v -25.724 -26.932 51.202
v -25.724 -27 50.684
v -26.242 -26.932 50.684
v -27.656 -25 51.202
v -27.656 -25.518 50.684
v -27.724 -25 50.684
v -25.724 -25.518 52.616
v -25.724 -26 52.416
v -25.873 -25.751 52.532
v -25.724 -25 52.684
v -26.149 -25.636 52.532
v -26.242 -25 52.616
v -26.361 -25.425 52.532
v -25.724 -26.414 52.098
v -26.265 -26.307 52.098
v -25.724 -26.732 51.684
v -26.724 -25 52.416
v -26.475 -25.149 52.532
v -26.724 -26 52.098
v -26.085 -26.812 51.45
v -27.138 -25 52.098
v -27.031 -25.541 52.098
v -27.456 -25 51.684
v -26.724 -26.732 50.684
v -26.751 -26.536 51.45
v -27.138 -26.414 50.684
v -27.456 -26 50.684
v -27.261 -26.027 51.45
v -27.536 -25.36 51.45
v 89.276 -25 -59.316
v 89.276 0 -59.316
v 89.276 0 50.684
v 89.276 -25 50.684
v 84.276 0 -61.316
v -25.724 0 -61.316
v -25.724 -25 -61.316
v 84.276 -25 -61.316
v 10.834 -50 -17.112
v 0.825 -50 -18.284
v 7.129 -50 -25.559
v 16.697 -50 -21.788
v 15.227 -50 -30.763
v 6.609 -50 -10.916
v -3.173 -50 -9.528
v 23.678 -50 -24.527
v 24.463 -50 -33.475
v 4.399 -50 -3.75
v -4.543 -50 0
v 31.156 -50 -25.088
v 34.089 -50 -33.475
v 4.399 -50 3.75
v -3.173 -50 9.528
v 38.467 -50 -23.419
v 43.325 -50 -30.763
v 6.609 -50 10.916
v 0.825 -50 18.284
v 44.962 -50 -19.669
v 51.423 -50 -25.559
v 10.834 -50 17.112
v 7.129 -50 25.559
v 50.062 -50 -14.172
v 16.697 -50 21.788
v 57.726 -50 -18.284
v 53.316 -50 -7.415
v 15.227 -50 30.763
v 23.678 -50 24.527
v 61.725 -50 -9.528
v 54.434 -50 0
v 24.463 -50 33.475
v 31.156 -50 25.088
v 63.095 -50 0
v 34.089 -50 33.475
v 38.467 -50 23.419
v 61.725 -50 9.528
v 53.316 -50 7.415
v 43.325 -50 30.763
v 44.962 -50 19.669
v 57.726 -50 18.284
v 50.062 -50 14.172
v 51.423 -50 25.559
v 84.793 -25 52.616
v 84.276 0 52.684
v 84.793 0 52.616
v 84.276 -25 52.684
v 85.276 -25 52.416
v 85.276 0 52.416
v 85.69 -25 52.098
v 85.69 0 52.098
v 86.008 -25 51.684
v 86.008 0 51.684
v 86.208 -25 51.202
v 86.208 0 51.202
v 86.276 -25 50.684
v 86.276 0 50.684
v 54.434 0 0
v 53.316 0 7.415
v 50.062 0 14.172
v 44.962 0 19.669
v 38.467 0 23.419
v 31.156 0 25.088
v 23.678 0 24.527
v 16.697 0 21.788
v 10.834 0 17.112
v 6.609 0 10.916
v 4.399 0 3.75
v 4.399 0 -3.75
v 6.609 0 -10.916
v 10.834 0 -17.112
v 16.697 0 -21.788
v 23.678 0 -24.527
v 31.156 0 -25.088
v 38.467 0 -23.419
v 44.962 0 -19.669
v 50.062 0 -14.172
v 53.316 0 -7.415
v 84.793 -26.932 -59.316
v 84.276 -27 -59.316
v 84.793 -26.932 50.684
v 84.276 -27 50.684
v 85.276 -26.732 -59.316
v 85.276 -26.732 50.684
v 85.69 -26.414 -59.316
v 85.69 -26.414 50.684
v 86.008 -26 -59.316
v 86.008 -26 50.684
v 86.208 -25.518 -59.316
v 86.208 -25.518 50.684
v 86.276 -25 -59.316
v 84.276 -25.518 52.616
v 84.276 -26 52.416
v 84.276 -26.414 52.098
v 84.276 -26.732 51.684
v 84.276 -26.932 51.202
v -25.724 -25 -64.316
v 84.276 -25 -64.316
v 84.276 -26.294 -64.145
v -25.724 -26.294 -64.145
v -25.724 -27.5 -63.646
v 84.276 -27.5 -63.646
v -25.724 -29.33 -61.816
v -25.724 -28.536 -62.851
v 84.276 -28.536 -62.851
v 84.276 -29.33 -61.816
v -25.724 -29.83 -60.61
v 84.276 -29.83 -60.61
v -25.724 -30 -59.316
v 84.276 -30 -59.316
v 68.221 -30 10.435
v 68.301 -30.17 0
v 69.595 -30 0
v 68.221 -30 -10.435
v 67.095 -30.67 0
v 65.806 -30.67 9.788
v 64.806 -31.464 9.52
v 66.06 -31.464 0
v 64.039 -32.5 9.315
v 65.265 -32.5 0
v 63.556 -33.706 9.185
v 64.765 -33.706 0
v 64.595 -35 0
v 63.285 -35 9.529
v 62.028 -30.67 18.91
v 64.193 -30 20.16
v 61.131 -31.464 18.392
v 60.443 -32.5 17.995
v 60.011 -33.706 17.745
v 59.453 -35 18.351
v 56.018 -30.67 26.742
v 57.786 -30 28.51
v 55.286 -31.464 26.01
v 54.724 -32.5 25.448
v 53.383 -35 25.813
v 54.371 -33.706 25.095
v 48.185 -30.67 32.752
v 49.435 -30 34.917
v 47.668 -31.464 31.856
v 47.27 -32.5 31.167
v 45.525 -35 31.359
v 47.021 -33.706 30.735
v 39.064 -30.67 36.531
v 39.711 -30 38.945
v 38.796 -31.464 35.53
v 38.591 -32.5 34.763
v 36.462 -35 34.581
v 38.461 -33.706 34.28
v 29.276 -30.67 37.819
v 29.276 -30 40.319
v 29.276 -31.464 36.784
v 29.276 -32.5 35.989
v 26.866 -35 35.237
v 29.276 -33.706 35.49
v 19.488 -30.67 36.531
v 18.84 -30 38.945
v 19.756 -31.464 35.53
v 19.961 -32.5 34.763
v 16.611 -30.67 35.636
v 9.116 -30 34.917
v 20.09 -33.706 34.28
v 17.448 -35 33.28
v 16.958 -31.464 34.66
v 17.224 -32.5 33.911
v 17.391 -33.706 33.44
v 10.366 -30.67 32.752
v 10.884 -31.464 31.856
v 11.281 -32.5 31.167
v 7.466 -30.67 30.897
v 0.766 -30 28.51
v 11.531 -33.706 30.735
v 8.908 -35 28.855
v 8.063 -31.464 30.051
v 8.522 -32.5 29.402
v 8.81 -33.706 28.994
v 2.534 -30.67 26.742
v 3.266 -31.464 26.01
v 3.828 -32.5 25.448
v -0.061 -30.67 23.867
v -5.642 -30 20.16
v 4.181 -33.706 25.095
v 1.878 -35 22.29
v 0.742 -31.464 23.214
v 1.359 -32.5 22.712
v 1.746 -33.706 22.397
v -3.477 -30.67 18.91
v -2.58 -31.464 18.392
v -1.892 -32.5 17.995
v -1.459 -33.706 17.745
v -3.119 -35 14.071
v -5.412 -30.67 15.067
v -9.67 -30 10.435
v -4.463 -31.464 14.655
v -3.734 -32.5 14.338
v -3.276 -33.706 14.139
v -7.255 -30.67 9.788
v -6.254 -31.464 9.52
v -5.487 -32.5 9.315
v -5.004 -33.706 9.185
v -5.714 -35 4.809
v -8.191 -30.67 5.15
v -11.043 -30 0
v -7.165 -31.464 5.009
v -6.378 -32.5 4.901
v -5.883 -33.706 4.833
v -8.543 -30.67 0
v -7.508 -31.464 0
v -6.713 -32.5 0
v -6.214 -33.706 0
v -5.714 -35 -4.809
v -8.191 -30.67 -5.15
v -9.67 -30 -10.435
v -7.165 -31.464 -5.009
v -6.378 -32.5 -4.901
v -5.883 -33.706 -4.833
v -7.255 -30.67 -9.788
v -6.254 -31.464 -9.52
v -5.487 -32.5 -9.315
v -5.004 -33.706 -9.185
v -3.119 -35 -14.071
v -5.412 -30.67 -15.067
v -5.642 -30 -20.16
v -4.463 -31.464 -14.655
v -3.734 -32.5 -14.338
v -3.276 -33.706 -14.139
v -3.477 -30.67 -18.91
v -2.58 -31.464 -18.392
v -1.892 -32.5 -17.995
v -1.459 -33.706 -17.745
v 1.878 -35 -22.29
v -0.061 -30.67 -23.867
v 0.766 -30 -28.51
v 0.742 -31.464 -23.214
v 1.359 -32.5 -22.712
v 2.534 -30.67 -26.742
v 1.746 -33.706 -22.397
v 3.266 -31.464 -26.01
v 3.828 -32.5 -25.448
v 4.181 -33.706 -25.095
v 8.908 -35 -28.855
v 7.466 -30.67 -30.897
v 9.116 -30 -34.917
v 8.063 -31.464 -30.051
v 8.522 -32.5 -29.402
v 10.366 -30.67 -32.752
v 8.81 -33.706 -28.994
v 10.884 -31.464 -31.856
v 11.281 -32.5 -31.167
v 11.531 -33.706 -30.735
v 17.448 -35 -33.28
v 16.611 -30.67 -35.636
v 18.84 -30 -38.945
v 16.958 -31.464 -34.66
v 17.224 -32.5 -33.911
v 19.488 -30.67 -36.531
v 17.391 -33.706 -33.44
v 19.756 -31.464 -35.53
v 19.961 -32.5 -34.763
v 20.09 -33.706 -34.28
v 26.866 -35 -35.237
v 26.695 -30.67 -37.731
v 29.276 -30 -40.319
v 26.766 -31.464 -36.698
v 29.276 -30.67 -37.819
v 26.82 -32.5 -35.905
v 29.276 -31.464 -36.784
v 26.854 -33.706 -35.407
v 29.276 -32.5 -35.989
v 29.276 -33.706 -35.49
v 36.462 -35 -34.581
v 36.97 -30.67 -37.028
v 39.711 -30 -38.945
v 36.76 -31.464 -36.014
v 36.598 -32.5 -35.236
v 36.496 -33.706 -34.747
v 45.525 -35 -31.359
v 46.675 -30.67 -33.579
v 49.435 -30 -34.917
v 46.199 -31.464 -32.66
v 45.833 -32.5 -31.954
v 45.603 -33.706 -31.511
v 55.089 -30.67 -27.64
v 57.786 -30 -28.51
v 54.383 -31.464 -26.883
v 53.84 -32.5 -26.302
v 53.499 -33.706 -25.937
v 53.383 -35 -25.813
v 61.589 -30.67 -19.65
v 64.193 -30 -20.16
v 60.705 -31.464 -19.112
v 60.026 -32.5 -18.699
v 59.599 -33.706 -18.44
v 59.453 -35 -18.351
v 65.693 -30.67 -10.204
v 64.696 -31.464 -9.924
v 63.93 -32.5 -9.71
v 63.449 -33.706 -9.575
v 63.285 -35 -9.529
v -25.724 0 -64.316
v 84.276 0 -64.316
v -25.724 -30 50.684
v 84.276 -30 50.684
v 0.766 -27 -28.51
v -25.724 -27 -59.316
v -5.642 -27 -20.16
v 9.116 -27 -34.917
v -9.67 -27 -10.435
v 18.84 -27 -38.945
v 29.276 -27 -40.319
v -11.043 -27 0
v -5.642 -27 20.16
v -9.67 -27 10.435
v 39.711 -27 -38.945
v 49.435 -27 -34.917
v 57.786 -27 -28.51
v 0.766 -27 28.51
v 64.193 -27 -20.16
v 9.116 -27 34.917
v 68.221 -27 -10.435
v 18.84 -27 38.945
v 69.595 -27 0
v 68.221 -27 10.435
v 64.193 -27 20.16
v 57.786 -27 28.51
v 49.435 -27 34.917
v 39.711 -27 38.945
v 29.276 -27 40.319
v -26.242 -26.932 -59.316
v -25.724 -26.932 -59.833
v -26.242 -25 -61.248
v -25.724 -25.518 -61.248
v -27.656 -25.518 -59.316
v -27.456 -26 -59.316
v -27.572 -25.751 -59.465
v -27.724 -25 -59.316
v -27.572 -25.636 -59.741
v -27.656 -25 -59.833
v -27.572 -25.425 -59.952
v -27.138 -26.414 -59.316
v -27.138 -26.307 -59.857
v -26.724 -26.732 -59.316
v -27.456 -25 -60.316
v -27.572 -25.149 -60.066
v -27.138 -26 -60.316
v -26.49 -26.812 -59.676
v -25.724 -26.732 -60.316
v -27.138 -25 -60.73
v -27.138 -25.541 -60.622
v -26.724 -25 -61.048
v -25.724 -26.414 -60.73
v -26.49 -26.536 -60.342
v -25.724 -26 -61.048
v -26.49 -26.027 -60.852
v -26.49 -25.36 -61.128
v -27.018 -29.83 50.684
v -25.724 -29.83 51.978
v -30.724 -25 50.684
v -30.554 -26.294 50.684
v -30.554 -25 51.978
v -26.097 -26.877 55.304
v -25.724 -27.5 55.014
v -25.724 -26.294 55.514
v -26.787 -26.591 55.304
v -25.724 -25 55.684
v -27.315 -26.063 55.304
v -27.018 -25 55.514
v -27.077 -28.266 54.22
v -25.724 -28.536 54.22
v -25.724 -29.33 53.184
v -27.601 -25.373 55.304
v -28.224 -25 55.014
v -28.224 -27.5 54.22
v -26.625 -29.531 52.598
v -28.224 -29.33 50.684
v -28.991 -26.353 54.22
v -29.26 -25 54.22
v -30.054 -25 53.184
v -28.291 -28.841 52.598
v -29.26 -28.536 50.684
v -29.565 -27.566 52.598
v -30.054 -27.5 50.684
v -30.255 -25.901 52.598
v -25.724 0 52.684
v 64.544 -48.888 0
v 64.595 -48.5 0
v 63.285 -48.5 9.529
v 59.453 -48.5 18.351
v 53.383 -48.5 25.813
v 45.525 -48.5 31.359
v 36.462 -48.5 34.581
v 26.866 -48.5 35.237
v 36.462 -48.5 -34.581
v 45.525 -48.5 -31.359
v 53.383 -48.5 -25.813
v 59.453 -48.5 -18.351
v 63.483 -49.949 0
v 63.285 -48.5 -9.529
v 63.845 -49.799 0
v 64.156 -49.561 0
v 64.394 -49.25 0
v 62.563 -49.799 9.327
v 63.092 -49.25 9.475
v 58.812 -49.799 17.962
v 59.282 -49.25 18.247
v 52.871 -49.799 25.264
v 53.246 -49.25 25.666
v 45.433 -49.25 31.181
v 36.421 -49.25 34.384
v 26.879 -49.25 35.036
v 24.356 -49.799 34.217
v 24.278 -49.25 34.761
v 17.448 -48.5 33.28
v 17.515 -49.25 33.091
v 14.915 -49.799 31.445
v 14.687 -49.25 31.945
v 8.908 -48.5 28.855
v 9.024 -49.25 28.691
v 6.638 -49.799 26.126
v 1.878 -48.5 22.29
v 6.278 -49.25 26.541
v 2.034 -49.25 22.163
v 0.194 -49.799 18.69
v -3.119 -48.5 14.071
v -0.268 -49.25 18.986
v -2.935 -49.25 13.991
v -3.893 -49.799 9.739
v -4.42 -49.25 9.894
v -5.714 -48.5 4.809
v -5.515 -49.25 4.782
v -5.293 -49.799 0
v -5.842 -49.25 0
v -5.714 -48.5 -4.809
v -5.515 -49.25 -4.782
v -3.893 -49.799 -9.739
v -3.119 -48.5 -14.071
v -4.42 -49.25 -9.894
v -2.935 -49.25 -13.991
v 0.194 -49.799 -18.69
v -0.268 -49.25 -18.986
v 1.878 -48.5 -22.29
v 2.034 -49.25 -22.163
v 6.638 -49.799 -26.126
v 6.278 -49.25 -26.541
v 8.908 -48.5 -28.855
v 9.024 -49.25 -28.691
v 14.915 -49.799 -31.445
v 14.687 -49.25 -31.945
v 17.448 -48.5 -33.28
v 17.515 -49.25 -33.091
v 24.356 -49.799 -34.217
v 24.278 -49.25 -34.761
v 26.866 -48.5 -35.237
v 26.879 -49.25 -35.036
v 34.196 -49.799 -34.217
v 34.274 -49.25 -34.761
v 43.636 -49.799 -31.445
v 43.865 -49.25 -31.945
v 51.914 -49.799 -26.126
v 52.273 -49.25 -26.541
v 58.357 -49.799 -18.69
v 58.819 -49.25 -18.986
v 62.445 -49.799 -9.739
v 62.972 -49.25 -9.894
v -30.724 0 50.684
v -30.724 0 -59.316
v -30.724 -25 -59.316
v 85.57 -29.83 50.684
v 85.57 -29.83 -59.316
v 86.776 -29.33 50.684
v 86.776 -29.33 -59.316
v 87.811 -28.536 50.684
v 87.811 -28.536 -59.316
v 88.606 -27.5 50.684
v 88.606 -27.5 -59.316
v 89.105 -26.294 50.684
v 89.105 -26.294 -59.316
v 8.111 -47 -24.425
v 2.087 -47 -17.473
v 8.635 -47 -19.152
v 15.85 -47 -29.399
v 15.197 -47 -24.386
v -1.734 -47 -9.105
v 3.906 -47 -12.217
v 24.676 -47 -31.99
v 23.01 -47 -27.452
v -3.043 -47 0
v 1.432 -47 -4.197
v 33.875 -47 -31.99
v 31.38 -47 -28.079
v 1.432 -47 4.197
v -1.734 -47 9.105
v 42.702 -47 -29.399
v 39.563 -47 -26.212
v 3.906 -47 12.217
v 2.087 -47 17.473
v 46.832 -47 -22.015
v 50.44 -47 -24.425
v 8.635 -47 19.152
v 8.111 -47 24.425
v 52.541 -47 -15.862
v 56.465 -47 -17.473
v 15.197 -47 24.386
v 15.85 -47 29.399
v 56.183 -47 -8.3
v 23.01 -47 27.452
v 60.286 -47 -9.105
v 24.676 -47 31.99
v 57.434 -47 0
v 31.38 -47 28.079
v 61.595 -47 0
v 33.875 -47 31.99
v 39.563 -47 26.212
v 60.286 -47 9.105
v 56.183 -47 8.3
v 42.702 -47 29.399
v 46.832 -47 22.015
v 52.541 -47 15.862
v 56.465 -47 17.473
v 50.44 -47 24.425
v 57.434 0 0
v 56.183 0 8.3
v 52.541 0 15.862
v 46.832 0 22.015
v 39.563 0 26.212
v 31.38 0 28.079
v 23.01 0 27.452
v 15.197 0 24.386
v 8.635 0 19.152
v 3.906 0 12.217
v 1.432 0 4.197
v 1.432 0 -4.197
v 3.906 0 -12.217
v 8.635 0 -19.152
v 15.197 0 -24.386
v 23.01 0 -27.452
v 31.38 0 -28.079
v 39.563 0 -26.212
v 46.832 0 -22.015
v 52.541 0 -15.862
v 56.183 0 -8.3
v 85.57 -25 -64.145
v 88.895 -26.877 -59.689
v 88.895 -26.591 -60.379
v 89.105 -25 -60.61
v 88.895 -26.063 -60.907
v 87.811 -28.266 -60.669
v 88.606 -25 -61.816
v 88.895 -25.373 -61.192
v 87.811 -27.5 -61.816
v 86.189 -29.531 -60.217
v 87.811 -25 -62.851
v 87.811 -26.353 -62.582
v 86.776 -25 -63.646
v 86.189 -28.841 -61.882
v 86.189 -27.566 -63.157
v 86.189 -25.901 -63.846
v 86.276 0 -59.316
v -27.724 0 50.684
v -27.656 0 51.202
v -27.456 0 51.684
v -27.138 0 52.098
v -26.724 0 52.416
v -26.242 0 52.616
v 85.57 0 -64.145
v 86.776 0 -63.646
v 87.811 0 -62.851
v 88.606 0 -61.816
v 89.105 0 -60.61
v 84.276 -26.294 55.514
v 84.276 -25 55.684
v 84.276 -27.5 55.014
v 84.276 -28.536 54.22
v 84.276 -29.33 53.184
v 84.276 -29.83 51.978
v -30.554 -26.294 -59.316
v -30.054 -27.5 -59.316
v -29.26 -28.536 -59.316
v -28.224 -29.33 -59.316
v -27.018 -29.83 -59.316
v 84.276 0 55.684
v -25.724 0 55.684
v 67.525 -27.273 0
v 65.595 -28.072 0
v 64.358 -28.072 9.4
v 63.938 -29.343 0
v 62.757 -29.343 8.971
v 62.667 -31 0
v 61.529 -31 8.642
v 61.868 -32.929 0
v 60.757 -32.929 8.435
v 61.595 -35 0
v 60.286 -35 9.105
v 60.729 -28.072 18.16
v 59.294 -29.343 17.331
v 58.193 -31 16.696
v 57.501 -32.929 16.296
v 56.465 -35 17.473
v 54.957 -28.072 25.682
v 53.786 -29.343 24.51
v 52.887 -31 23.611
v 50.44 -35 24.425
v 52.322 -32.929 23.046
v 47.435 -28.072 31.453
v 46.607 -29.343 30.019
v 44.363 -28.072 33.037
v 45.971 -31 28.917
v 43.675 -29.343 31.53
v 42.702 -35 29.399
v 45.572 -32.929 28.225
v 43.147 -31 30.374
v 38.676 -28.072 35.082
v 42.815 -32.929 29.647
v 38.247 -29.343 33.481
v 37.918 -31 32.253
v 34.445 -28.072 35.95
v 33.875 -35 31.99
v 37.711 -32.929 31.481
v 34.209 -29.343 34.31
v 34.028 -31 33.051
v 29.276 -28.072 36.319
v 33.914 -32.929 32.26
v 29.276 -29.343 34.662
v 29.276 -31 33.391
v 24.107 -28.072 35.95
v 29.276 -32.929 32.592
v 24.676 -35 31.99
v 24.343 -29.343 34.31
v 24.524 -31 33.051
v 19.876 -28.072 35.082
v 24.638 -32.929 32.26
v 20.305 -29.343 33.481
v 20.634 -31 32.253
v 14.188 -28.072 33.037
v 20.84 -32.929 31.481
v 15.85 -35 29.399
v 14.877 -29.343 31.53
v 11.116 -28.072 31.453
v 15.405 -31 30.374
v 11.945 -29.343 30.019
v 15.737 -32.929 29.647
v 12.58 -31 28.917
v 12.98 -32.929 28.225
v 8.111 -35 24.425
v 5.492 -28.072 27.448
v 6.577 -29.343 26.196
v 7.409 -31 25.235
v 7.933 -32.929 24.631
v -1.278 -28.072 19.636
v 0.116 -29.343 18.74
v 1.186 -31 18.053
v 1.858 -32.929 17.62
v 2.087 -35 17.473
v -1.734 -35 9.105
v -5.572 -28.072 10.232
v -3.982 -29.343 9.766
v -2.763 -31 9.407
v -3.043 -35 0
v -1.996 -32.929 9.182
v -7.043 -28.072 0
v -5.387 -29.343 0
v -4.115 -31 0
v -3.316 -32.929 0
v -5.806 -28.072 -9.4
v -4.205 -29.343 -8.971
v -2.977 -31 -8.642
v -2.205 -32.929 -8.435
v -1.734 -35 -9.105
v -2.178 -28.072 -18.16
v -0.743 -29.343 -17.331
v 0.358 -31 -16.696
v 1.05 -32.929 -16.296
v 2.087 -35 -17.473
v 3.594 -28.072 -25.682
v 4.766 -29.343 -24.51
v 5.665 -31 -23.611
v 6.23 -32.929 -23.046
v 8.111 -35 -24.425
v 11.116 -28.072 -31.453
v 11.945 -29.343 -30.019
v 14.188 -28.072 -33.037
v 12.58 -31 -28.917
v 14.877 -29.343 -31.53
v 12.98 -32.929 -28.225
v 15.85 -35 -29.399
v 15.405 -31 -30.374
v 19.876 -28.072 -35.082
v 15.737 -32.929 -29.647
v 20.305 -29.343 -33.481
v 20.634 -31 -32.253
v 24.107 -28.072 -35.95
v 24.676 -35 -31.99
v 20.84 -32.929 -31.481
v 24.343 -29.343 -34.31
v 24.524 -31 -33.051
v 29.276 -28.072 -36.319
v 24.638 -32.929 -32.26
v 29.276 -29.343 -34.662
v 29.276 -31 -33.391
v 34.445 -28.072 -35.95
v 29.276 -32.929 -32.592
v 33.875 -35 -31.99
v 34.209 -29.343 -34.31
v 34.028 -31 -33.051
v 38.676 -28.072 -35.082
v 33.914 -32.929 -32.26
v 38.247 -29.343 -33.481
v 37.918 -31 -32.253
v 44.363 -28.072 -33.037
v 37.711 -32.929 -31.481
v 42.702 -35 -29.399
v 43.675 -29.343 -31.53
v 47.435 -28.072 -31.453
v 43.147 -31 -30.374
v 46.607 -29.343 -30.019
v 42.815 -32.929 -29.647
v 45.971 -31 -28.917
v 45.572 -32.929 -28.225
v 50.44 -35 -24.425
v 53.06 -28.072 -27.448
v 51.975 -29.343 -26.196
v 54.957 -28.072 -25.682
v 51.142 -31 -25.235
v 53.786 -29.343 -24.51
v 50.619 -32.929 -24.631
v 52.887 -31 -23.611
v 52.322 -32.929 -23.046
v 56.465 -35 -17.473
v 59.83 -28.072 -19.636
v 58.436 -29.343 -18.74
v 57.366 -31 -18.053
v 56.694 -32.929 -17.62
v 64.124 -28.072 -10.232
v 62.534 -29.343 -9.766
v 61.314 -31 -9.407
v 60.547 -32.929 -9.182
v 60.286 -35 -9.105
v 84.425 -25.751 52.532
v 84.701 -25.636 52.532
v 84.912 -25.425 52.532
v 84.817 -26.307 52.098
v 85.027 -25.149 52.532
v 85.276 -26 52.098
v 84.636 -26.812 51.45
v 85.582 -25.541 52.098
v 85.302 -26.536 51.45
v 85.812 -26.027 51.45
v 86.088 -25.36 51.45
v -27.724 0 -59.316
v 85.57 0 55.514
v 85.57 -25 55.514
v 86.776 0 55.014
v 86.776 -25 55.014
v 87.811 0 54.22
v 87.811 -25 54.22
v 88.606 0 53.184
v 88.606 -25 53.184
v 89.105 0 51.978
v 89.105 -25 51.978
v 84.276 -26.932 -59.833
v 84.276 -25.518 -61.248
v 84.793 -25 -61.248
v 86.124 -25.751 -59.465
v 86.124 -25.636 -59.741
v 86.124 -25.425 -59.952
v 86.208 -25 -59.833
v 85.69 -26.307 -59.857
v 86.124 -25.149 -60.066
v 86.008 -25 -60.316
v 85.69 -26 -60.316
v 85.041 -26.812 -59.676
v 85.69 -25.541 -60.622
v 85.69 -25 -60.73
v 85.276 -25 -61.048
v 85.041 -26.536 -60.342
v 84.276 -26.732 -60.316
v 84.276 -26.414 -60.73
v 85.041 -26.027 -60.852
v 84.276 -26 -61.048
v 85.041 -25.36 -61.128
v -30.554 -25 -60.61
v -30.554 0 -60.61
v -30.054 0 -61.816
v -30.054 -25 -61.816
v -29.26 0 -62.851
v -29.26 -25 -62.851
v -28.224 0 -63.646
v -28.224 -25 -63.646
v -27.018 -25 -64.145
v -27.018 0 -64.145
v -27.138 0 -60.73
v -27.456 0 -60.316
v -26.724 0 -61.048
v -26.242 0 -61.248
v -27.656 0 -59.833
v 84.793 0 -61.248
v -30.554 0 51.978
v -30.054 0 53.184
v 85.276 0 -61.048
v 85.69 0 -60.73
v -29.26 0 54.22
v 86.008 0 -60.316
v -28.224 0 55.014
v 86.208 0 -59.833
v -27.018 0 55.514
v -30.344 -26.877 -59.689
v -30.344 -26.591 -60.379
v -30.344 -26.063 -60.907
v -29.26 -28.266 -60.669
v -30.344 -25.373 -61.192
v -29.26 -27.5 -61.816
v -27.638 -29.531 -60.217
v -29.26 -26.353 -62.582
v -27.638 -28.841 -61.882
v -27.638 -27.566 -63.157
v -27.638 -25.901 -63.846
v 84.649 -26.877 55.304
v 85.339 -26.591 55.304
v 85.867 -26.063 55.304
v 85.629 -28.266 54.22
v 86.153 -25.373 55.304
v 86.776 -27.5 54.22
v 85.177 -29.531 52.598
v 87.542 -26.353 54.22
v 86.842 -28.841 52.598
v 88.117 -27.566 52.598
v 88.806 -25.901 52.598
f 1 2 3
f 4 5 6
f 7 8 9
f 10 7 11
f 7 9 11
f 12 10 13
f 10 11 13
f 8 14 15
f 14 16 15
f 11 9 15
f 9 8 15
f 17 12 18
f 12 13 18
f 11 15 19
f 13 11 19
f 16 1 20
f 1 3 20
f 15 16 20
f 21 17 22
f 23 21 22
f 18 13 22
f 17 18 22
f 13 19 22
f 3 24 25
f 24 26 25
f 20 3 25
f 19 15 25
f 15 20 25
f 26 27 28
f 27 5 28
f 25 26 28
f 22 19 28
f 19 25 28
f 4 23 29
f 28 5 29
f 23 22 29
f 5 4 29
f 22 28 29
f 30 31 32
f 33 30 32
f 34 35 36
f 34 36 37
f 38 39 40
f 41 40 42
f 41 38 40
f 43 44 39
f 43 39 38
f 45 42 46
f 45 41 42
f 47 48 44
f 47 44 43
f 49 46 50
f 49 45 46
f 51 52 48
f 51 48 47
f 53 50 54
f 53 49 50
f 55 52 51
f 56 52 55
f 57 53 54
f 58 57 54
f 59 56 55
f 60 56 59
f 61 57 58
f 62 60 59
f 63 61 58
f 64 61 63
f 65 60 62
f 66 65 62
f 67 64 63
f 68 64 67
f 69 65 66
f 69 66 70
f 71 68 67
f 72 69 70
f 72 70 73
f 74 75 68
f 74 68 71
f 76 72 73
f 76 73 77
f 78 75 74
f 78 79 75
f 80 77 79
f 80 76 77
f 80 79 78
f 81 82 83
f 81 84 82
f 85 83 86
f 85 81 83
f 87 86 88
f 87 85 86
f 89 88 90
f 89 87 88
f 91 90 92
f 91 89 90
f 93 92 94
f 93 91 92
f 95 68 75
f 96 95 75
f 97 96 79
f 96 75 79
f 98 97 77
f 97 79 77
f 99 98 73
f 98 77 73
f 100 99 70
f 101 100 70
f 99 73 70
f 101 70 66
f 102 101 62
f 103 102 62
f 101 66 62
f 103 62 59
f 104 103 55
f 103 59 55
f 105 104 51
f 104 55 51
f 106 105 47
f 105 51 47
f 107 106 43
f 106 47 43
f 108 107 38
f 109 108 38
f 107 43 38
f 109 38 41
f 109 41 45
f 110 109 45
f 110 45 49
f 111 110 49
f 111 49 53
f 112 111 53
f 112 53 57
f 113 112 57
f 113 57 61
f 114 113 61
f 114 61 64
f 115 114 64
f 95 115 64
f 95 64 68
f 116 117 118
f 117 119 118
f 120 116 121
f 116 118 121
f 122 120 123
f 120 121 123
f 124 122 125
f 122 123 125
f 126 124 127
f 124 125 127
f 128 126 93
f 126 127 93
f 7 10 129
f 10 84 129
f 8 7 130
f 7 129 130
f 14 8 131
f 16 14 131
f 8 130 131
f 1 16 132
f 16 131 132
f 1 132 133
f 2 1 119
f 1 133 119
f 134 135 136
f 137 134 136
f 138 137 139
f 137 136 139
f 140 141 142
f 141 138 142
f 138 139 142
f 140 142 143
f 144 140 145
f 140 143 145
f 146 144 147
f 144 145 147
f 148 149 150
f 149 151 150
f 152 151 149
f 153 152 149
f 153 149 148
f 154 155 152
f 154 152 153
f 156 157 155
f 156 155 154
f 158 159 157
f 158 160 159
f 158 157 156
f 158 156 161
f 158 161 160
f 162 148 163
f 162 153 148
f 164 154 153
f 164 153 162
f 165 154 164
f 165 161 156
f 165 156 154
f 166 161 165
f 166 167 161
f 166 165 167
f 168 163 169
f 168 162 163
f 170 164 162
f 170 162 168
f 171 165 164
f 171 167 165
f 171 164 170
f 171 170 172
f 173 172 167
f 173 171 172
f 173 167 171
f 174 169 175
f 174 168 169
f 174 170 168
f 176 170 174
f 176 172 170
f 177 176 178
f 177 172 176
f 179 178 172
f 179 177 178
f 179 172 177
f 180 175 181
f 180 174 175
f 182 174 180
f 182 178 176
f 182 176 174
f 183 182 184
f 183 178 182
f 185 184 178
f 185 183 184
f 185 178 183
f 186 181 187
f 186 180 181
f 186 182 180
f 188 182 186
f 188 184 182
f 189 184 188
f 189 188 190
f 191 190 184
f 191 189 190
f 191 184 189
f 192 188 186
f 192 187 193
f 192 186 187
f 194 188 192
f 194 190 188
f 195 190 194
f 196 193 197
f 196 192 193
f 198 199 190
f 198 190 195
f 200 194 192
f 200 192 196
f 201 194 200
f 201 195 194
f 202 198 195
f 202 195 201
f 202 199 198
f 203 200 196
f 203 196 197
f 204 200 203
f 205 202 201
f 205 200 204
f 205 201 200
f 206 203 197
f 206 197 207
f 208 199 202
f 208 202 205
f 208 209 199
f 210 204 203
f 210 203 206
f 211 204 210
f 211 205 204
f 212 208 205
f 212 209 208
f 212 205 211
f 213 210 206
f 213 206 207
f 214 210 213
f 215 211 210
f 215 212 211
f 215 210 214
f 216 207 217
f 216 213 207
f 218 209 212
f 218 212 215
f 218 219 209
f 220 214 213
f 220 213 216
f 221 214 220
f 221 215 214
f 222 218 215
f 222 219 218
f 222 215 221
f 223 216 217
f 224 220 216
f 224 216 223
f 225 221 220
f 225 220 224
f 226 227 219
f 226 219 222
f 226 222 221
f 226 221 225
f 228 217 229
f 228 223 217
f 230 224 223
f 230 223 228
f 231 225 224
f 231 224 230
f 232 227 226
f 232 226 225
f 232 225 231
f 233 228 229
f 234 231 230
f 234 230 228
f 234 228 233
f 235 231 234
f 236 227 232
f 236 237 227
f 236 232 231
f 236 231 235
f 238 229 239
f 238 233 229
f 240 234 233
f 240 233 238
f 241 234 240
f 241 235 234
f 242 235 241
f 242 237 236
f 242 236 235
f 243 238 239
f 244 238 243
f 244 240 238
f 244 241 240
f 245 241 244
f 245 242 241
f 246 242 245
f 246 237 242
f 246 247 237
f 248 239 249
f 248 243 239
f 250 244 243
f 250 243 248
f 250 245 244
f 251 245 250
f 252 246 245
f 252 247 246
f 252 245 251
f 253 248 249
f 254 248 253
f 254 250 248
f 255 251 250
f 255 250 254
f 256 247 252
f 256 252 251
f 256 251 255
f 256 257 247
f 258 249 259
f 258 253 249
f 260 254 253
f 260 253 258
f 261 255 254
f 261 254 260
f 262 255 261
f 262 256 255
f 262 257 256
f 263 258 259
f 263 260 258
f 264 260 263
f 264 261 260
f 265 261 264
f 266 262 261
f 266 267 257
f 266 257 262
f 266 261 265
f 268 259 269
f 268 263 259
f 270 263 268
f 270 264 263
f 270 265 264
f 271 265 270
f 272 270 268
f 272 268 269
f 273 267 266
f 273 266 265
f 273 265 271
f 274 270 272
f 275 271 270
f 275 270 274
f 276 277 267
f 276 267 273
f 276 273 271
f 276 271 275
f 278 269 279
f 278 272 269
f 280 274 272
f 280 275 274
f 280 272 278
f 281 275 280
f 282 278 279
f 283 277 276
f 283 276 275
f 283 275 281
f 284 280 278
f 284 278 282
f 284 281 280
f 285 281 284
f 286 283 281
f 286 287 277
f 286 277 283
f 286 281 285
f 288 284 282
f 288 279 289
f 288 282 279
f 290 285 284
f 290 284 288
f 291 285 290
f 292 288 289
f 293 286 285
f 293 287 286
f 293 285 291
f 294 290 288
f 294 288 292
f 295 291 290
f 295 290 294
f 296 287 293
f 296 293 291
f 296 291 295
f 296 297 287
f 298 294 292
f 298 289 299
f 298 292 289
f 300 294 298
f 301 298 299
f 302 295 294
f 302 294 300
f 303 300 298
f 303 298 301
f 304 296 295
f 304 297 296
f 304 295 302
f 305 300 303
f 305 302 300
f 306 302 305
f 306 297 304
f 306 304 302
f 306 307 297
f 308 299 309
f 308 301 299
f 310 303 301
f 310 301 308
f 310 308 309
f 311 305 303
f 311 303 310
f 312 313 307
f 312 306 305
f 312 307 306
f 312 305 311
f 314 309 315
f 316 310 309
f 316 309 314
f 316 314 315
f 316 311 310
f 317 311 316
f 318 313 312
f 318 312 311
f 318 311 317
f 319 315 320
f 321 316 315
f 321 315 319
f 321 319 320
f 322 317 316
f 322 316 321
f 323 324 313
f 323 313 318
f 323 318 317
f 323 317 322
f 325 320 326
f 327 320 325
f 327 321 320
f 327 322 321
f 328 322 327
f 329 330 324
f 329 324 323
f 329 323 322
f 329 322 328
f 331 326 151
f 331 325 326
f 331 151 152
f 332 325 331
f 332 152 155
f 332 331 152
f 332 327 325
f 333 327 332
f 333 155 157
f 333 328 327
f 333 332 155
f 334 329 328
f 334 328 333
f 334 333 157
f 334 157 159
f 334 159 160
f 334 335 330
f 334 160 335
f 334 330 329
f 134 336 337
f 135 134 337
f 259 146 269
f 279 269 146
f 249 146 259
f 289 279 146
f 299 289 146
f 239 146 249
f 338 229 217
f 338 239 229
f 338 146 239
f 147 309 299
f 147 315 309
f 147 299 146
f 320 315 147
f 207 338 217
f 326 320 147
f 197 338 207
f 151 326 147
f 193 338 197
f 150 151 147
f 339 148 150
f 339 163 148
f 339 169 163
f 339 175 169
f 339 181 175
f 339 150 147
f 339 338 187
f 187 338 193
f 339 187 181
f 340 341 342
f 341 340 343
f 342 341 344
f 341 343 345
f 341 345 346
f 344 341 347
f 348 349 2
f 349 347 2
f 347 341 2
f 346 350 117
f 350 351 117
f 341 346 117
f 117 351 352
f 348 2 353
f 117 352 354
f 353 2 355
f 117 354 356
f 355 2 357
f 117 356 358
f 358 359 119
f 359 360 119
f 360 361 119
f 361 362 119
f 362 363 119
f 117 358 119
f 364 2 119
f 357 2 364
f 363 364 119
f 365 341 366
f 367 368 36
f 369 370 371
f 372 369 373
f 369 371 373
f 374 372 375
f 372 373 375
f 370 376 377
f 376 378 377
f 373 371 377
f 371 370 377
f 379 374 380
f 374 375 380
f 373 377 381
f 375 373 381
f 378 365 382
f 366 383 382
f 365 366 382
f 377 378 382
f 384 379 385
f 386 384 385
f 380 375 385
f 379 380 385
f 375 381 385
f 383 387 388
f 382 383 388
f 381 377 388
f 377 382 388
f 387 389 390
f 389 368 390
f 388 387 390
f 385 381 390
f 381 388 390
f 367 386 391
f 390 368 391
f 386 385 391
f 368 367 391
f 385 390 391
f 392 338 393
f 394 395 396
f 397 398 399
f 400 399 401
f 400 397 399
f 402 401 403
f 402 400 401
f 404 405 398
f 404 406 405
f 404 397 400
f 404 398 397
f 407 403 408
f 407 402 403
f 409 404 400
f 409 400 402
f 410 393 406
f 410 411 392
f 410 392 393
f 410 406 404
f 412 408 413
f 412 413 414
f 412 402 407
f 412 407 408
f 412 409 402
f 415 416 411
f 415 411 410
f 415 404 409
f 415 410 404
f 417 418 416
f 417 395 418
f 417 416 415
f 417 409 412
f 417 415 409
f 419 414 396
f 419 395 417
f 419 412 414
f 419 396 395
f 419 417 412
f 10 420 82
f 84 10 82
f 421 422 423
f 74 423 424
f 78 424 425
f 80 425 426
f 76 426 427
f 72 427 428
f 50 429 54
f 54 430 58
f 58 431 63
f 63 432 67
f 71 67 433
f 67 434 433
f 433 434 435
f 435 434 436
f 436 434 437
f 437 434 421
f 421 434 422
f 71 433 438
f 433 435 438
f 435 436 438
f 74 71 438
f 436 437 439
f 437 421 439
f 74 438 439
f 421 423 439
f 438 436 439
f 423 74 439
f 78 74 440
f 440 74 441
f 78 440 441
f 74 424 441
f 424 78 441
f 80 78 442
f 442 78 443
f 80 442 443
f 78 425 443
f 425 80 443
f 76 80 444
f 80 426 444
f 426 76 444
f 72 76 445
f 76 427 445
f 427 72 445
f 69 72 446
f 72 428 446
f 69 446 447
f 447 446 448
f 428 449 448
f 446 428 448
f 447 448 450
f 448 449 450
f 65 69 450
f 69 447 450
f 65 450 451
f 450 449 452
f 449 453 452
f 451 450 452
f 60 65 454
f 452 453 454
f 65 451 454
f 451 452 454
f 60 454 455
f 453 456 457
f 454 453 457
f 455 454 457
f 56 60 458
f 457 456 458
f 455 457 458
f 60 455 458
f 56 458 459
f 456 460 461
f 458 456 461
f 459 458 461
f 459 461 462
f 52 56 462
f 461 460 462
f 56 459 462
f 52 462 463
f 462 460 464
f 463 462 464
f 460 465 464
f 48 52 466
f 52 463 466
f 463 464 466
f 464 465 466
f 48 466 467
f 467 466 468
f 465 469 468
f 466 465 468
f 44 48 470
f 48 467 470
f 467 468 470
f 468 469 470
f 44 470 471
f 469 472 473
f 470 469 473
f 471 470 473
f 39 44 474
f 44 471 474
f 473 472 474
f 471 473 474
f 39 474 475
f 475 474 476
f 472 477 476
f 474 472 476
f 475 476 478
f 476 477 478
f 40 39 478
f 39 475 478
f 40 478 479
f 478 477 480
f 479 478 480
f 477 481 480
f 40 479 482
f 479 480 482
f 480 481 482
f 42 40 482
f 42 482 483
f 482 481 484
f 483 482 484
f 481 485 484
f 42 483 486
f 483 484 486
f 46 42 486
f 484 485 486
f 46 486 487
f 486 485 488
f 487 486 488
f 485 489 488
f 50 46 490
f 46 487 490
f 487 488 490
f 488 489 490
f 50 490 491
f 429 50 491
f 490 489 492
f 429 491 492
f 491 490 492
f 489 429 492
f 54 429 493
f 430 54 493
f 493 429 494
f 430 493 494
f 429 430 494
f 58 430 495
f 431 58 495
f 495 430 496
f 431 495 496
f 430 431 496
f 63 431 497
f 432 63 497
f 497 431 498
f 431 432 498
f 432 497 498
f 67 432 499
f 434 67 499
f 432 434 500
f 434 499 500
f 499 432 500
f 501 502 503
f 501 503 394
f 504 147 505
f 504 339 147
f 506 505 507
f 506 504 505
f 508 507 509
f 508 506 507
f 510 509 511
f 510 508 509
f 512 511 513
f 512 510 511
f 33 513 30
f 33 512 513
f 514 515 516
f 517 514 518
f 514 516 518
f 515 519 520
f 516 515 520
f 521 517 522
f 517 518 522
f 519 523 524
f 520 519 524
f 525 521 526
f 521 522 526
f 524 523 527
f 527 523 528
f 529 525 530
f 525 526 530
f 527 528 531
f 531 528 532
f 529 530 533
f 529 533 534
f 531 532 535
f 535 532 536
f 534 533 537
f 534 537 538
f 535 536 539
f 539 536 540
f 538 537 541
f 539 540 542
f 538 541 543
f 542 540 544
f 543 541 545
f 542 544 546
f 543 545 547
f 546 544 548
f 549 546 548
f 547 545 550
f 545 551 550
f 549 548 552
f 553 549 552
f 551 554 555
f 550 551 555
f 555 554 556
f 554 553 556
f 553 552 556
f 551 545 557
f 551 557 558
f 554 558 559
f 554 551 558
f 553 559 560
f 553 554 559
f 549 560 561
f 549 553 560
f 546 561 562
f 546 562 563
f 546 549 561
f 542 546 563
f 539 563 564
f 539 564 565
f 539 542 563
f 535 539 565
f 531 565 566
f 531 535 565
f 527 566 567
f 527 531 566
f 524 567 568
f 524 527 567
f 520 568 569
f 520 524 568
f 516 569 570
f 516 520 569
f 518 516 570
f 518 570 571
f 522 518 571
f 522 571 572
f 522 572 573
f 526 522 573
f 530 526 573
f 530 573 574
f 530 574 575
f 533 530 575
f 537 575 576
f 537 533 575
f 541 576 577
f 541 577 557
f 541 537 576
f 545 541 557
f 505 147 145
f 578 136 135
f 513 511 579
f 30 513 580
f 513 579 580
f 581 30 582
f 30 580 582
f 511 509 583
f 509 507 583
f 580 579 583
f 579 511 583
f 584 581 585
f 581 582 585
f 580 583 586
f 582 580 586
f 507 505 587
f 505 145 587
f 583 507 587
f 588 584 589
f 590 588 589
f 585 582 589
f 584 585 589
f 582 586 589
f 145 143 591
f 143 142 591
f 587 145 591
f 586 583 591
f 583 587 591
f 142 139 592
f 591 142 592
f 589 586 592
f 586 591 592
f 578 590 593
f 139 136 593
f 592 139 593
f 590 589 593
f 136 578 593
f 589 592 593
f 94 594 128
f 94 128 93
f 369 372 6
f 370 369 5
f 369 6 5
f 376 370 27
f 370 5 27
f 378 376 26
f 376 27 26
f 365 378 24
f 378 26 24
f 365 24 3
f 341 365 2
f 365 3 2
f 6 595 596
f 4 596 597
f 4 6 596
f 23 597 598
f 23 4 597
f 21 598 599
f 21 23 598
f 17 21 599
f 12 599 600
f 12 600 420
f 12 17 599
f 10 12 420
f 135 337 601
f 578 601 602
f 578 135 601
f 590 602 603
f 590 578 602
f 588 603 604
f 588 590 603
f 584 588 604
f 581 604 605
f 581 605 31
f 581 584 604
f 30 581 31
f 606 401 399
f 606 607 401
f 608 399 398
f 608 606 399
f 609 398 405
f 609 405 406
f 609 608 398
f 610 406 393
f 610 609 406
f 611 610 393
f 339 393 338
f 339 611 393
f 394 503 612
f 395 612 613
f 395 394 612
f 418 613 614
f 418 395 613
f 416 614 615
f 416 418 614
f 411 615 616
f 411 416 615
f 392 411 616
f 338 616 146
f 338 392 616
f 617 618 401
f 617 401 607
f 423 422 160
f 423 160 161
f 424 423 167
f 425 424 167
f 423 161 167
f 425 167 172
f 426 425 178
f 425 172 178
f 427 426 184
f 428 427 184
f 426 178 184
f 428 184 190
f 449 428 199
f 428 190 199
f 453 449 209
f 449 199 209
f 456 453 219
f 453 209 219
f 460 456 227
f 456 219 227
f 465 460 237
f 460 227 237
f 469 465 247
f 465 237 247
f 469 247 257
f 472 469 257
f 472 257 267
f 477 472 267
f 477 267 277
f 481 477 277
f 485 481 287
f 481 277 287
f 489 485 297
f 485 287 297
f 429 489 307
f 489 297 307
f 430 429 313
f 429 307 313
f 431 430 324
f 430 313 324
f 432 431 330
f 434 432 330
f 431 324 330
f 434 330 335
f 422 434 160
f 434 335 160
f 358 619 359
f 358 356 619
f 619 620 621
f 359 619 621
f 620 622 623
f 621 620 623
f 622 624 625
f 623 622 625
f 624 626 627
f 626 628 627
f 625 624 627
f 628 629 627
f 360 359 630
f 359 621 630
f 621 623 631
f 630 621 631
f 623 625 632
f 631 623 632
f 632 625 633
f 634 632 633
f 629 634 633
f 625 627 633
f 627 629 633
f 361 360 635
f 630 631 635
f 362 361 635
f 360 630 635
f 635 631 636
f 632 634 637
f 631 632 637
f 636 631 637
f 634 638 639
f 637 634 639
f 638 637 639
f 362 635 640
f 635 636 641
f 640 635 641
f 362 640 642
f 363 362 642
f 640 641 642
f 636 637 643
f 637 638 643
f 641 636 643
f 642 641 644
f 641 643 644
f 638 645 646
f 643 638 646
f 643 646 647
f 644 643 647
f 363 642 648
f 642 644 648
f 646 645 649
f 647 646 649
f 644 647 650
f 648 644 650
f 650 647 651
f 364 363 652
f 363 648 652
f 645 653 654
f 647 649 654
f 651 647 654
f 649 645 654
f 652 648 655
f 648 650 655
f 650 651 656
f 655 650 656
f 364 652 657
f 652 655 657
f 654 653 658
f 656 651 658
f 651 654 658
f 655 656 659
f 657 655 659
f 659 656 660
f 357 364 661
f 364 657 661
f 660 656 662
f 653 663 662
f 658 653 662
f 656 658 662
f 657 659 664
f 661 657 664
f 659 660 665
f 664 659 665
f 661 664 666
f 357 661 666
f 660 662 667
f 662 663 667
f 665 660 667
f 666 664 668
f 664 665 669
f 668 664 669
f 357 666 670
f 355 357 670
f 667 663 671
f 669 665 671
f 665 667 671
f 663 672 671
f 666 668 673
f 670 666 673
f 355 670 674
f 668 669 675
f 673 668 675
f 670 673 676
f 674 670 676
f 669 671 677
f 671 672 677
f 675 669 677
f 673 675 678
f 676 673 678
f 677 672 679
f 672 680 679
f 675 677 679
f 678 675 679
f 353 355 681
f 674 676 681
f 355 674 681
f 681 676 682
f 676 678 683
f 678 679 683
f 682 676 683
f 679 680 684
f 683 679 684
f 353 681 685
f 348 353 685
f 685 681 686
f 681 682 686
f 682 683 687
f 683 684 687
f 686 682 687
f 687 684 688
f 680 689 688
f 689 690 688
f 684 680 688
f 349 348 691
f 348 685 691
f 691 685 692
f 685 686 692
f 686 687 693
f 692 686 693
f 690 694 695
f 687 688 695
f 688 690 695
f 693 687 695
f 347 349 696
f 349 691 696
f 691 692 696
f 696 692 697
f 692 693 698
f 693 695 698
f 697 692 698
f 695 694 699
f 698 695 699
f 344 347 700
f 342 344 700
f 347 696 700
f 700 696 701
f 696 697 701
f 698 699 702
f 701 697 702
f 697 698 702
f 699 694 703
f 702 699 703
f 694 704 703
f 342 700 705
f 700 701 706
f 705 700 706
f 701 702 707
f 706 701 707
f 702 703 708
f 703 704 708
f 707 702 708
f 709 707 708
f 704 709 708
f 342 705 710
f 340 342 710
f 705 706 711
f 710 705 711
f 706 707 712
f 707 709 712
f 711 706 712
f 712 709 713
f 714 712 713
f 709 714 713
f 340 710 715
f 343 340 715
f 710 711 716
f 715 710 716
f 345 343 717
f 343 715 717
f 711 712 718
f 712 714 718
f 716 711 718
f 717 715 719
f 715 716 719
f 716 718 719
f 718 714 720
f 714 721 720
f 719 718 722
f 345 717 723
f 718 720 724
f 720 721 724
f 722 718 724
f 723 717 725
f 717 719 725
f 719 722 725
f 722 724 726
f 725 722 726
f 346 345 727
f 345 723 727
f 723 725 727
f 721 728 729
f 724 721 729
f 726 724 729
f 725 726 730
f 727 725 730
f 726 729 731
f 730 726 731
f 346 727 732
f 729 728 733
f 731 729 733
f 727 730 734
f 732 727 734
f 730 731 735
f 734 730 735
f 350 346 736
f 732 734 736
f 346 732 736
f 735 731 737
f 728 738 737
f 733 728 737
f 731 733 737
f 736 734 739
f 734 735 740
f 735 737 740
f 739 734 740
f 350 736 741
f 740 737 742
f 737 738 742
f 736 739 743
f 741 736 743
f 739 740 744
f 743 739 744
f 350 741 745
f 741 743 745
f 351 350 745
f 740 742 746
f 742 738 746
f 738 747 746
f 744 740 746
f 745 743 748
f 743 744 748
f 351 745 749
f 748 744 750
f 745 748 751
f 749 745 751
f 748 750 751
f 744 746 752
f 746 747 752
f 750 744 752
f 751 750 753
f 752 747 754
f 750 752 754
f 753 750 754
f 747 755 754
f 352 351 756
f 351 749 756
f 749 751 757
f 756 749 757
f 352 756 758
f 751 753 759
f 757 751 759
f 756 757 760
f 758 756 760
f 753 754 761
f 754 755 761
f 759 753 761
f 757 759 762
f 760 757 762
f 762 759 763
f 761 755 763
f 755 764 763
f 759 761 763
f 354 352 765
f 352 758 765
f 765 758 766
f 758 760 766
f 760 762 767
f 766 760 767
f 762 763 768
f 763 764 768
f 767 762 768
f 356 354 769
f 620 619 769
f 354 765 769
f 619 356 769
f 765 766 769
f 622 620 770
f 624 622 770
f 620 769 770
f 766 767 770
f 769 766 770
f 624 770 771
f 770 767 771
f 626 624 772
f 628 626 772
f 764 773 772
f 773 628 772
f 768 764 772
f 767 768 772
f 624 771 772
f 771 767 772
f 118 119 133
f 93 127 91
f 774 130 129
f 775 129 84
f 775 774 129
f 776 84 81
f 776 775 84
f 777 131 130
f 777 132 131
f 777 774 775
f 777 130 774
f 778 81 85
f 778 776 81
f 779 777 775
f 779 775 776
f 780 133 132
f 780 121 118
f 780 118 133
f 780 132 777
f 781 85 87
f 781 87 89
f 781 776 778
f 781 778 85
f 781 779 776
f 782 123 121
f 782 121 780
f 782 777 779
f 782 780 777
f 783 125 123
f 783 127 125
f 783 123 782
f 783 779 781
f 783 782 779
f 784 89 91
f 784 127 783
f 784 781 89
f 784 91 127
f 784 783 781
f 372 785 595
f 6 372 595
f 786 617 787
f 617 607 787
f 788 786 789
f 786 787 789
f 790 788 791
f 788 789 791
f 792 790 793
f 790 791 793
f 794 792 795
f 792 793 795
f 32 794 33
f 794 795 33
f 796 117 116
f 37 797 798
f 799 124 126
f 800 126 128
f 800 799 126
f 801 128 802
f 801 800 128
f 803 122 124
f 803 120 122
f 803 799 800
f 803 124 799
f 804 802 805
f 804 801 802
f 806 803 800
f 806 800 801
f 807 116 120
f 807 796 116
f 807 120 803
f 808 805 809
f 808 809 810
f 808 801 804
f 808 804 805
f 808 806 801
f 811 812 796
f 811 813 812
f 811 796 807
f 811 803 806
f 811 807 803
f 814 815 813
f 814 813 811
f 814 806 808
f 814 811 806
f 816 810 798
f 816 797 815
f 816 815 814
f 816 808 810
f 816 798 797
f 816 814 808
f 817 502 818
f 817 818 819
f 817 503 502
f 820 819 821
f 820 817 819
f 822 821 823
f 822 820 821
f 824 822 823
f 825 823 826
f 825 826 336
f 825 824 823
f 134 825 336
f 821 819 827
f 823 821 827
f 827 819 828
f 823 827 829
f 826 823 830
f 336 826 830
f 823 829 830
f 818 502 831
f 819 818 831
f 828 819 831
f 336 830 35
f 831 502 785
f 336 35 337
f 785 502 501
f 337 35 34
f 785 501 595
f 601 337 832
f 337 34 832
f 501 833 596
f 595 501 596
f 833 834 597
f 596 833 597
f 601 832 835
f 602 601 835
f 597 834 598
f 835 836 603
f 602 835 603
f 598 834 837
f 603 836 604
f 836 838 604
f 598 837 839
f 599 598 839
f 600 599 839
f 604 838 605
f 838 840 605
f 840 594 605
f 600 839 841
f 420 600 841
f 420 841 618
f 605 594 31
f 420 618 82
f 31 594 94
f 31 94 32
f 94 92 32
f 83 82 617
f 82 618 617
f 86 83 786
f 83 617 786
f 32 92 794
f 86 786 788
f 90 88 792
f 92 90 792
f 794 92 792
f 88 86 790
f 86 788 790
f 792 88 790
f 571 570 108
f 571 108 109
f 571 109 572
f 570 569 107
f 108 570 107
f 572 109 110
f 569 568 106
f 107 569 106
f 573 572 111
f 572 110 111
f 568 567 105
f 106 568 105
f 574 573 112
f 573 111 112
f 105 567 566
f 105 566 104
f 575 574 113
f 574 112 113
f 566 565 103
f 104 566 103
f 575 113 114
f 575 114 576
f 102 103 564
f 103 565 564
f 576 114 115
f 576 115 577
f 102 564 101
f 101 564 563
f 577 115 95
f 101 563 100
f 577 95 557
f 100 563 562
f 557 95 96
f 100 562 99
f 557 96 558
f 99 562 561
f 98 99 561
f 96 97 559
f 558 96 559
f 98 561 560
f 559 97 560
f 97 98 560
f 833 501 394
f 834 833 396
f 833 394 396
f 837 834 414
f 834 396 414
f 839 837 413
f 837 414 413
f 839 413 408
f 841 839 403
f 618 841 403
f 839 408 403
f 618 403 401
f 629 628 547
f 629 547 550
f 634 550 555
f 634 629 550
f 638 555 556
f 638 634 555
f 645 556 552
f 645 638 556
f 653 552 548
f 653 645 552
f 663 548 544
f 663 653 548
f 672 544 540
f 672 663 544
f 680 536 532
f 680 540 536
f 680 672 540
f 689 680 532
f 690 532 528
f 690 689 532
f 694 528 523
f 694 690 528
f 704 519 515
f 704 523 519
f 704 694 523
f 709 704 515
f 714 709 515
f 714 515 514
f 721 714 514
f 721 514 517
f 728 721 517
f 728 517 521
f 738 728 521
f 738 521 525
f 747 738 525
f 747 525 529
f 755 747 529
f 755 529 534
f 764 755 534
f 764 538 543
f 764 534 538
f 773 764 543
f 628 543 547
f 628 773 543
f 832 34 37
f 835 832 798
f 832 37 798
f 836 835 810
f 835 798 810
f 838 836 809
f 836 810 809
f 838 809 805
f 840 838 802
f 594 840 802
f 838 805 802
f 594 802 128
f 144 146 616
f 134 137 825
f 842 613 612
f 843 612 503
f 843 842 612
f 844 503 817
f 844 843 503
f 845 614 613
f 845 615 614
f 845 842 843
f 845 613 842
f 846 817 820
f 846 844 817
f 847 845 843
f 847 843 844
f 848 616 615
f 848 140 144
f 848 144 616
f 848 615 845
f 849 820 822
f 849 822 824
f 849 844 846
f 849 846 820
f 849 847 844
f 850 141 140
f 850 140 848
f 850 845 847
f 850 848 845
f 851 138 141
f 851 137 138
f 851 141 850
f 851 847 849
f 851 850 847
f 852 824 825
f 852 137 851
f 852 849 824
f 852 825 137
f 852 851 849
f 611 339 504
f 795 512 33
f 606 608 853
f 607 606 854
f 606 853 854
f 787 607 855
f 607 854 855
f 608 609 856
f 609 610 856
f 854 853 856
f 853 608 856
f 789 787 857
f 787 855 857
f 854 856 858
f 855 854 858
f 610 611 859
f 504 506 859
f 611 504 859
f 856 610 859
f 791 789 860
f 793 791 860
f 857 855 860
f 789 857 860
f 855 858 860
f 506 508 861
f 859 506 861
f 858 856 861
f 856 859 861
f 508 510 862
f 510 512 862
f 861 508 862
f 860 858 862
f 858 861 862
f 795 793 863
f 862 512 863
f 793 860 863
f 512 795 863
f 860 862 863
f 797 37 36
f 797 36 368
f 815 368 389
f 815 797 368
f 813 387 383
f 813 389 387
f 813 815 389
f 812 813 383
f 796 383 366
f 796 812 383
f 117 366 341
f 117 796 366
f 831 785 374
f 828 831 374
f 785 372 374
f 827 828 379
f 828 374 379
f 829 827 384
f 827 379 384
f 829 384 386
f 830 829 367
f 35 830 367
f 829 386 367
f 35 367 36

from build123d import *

# Parameters (mm, degrees)
F0_W     = 120
F0_H     = 120
F1_DEPTH = 30
F2_R     = 35.3192378902
F3_DEPTH = 20
F4_R     = 25.158067948
F5_DEPTH = 106.934
F6_R     = 5
F7_R     = 1.5
F8_T     = -3


with BuildPart() as f1:
    # F0 (on Front) → F1 (new body)
    with BuildSketch(Plane.XZ):
        with Locations((29.2758518457, -4.3157362938)):
            Rectangle(F0_W, F0_H)
    extrude(amount=F1_DEPTH)

    # F2 (on face) → F3 (join)
    with BuildSketch(Plane.XZ.offset(30)):
        with Locations((29.2758518457, 0)):
            Circle(F2_R)
    extrude(amount=F3_DEPTH)

    # F4 (on face) → F5 (cut)
    with BuildSketch(Plane.XZ.offset(50)):
        with Locations((29.2758518457, 0)):
            Circle(F4_R)
    extrude(amount=-F5_DEPTH, mode=Mode.SUBTRACT)

    # F6
    f6_edges = [f1.edges().sort_by_distance(p)[0] for p in [
        (29.275852, -30, -64.315736),
        (-30.724148, -30, -4.315736),
        (89.275852, -30, -4.315736),
        (29.275852, -30, 55.684264),
        (-6.043386, -30, 0),
        (-30.724148, -15, 55.684264),
        (89.275852, -15, 55.684264),
        (89.275852, -15, -64.315736),
        (-30.724148, -15, -64.315736),
    ]]
    fillet(f6_edges, radius=F6_R)

    # F7
    f7_edges = [f1.edges().sort_by_distance(p)[0] for p in [
        (-6.043386, -50, 0),
    ]]
    fillet(f7_edges, radius=F7_R)

    # F8
    f8_openings = [f1.faces().sort_by_distance(p)[0] for p in [
        (29.275852, 0, -62.61868),
    ]]
    offset(amount=F8_T, openings=f8_openings)


solid = f1.part
